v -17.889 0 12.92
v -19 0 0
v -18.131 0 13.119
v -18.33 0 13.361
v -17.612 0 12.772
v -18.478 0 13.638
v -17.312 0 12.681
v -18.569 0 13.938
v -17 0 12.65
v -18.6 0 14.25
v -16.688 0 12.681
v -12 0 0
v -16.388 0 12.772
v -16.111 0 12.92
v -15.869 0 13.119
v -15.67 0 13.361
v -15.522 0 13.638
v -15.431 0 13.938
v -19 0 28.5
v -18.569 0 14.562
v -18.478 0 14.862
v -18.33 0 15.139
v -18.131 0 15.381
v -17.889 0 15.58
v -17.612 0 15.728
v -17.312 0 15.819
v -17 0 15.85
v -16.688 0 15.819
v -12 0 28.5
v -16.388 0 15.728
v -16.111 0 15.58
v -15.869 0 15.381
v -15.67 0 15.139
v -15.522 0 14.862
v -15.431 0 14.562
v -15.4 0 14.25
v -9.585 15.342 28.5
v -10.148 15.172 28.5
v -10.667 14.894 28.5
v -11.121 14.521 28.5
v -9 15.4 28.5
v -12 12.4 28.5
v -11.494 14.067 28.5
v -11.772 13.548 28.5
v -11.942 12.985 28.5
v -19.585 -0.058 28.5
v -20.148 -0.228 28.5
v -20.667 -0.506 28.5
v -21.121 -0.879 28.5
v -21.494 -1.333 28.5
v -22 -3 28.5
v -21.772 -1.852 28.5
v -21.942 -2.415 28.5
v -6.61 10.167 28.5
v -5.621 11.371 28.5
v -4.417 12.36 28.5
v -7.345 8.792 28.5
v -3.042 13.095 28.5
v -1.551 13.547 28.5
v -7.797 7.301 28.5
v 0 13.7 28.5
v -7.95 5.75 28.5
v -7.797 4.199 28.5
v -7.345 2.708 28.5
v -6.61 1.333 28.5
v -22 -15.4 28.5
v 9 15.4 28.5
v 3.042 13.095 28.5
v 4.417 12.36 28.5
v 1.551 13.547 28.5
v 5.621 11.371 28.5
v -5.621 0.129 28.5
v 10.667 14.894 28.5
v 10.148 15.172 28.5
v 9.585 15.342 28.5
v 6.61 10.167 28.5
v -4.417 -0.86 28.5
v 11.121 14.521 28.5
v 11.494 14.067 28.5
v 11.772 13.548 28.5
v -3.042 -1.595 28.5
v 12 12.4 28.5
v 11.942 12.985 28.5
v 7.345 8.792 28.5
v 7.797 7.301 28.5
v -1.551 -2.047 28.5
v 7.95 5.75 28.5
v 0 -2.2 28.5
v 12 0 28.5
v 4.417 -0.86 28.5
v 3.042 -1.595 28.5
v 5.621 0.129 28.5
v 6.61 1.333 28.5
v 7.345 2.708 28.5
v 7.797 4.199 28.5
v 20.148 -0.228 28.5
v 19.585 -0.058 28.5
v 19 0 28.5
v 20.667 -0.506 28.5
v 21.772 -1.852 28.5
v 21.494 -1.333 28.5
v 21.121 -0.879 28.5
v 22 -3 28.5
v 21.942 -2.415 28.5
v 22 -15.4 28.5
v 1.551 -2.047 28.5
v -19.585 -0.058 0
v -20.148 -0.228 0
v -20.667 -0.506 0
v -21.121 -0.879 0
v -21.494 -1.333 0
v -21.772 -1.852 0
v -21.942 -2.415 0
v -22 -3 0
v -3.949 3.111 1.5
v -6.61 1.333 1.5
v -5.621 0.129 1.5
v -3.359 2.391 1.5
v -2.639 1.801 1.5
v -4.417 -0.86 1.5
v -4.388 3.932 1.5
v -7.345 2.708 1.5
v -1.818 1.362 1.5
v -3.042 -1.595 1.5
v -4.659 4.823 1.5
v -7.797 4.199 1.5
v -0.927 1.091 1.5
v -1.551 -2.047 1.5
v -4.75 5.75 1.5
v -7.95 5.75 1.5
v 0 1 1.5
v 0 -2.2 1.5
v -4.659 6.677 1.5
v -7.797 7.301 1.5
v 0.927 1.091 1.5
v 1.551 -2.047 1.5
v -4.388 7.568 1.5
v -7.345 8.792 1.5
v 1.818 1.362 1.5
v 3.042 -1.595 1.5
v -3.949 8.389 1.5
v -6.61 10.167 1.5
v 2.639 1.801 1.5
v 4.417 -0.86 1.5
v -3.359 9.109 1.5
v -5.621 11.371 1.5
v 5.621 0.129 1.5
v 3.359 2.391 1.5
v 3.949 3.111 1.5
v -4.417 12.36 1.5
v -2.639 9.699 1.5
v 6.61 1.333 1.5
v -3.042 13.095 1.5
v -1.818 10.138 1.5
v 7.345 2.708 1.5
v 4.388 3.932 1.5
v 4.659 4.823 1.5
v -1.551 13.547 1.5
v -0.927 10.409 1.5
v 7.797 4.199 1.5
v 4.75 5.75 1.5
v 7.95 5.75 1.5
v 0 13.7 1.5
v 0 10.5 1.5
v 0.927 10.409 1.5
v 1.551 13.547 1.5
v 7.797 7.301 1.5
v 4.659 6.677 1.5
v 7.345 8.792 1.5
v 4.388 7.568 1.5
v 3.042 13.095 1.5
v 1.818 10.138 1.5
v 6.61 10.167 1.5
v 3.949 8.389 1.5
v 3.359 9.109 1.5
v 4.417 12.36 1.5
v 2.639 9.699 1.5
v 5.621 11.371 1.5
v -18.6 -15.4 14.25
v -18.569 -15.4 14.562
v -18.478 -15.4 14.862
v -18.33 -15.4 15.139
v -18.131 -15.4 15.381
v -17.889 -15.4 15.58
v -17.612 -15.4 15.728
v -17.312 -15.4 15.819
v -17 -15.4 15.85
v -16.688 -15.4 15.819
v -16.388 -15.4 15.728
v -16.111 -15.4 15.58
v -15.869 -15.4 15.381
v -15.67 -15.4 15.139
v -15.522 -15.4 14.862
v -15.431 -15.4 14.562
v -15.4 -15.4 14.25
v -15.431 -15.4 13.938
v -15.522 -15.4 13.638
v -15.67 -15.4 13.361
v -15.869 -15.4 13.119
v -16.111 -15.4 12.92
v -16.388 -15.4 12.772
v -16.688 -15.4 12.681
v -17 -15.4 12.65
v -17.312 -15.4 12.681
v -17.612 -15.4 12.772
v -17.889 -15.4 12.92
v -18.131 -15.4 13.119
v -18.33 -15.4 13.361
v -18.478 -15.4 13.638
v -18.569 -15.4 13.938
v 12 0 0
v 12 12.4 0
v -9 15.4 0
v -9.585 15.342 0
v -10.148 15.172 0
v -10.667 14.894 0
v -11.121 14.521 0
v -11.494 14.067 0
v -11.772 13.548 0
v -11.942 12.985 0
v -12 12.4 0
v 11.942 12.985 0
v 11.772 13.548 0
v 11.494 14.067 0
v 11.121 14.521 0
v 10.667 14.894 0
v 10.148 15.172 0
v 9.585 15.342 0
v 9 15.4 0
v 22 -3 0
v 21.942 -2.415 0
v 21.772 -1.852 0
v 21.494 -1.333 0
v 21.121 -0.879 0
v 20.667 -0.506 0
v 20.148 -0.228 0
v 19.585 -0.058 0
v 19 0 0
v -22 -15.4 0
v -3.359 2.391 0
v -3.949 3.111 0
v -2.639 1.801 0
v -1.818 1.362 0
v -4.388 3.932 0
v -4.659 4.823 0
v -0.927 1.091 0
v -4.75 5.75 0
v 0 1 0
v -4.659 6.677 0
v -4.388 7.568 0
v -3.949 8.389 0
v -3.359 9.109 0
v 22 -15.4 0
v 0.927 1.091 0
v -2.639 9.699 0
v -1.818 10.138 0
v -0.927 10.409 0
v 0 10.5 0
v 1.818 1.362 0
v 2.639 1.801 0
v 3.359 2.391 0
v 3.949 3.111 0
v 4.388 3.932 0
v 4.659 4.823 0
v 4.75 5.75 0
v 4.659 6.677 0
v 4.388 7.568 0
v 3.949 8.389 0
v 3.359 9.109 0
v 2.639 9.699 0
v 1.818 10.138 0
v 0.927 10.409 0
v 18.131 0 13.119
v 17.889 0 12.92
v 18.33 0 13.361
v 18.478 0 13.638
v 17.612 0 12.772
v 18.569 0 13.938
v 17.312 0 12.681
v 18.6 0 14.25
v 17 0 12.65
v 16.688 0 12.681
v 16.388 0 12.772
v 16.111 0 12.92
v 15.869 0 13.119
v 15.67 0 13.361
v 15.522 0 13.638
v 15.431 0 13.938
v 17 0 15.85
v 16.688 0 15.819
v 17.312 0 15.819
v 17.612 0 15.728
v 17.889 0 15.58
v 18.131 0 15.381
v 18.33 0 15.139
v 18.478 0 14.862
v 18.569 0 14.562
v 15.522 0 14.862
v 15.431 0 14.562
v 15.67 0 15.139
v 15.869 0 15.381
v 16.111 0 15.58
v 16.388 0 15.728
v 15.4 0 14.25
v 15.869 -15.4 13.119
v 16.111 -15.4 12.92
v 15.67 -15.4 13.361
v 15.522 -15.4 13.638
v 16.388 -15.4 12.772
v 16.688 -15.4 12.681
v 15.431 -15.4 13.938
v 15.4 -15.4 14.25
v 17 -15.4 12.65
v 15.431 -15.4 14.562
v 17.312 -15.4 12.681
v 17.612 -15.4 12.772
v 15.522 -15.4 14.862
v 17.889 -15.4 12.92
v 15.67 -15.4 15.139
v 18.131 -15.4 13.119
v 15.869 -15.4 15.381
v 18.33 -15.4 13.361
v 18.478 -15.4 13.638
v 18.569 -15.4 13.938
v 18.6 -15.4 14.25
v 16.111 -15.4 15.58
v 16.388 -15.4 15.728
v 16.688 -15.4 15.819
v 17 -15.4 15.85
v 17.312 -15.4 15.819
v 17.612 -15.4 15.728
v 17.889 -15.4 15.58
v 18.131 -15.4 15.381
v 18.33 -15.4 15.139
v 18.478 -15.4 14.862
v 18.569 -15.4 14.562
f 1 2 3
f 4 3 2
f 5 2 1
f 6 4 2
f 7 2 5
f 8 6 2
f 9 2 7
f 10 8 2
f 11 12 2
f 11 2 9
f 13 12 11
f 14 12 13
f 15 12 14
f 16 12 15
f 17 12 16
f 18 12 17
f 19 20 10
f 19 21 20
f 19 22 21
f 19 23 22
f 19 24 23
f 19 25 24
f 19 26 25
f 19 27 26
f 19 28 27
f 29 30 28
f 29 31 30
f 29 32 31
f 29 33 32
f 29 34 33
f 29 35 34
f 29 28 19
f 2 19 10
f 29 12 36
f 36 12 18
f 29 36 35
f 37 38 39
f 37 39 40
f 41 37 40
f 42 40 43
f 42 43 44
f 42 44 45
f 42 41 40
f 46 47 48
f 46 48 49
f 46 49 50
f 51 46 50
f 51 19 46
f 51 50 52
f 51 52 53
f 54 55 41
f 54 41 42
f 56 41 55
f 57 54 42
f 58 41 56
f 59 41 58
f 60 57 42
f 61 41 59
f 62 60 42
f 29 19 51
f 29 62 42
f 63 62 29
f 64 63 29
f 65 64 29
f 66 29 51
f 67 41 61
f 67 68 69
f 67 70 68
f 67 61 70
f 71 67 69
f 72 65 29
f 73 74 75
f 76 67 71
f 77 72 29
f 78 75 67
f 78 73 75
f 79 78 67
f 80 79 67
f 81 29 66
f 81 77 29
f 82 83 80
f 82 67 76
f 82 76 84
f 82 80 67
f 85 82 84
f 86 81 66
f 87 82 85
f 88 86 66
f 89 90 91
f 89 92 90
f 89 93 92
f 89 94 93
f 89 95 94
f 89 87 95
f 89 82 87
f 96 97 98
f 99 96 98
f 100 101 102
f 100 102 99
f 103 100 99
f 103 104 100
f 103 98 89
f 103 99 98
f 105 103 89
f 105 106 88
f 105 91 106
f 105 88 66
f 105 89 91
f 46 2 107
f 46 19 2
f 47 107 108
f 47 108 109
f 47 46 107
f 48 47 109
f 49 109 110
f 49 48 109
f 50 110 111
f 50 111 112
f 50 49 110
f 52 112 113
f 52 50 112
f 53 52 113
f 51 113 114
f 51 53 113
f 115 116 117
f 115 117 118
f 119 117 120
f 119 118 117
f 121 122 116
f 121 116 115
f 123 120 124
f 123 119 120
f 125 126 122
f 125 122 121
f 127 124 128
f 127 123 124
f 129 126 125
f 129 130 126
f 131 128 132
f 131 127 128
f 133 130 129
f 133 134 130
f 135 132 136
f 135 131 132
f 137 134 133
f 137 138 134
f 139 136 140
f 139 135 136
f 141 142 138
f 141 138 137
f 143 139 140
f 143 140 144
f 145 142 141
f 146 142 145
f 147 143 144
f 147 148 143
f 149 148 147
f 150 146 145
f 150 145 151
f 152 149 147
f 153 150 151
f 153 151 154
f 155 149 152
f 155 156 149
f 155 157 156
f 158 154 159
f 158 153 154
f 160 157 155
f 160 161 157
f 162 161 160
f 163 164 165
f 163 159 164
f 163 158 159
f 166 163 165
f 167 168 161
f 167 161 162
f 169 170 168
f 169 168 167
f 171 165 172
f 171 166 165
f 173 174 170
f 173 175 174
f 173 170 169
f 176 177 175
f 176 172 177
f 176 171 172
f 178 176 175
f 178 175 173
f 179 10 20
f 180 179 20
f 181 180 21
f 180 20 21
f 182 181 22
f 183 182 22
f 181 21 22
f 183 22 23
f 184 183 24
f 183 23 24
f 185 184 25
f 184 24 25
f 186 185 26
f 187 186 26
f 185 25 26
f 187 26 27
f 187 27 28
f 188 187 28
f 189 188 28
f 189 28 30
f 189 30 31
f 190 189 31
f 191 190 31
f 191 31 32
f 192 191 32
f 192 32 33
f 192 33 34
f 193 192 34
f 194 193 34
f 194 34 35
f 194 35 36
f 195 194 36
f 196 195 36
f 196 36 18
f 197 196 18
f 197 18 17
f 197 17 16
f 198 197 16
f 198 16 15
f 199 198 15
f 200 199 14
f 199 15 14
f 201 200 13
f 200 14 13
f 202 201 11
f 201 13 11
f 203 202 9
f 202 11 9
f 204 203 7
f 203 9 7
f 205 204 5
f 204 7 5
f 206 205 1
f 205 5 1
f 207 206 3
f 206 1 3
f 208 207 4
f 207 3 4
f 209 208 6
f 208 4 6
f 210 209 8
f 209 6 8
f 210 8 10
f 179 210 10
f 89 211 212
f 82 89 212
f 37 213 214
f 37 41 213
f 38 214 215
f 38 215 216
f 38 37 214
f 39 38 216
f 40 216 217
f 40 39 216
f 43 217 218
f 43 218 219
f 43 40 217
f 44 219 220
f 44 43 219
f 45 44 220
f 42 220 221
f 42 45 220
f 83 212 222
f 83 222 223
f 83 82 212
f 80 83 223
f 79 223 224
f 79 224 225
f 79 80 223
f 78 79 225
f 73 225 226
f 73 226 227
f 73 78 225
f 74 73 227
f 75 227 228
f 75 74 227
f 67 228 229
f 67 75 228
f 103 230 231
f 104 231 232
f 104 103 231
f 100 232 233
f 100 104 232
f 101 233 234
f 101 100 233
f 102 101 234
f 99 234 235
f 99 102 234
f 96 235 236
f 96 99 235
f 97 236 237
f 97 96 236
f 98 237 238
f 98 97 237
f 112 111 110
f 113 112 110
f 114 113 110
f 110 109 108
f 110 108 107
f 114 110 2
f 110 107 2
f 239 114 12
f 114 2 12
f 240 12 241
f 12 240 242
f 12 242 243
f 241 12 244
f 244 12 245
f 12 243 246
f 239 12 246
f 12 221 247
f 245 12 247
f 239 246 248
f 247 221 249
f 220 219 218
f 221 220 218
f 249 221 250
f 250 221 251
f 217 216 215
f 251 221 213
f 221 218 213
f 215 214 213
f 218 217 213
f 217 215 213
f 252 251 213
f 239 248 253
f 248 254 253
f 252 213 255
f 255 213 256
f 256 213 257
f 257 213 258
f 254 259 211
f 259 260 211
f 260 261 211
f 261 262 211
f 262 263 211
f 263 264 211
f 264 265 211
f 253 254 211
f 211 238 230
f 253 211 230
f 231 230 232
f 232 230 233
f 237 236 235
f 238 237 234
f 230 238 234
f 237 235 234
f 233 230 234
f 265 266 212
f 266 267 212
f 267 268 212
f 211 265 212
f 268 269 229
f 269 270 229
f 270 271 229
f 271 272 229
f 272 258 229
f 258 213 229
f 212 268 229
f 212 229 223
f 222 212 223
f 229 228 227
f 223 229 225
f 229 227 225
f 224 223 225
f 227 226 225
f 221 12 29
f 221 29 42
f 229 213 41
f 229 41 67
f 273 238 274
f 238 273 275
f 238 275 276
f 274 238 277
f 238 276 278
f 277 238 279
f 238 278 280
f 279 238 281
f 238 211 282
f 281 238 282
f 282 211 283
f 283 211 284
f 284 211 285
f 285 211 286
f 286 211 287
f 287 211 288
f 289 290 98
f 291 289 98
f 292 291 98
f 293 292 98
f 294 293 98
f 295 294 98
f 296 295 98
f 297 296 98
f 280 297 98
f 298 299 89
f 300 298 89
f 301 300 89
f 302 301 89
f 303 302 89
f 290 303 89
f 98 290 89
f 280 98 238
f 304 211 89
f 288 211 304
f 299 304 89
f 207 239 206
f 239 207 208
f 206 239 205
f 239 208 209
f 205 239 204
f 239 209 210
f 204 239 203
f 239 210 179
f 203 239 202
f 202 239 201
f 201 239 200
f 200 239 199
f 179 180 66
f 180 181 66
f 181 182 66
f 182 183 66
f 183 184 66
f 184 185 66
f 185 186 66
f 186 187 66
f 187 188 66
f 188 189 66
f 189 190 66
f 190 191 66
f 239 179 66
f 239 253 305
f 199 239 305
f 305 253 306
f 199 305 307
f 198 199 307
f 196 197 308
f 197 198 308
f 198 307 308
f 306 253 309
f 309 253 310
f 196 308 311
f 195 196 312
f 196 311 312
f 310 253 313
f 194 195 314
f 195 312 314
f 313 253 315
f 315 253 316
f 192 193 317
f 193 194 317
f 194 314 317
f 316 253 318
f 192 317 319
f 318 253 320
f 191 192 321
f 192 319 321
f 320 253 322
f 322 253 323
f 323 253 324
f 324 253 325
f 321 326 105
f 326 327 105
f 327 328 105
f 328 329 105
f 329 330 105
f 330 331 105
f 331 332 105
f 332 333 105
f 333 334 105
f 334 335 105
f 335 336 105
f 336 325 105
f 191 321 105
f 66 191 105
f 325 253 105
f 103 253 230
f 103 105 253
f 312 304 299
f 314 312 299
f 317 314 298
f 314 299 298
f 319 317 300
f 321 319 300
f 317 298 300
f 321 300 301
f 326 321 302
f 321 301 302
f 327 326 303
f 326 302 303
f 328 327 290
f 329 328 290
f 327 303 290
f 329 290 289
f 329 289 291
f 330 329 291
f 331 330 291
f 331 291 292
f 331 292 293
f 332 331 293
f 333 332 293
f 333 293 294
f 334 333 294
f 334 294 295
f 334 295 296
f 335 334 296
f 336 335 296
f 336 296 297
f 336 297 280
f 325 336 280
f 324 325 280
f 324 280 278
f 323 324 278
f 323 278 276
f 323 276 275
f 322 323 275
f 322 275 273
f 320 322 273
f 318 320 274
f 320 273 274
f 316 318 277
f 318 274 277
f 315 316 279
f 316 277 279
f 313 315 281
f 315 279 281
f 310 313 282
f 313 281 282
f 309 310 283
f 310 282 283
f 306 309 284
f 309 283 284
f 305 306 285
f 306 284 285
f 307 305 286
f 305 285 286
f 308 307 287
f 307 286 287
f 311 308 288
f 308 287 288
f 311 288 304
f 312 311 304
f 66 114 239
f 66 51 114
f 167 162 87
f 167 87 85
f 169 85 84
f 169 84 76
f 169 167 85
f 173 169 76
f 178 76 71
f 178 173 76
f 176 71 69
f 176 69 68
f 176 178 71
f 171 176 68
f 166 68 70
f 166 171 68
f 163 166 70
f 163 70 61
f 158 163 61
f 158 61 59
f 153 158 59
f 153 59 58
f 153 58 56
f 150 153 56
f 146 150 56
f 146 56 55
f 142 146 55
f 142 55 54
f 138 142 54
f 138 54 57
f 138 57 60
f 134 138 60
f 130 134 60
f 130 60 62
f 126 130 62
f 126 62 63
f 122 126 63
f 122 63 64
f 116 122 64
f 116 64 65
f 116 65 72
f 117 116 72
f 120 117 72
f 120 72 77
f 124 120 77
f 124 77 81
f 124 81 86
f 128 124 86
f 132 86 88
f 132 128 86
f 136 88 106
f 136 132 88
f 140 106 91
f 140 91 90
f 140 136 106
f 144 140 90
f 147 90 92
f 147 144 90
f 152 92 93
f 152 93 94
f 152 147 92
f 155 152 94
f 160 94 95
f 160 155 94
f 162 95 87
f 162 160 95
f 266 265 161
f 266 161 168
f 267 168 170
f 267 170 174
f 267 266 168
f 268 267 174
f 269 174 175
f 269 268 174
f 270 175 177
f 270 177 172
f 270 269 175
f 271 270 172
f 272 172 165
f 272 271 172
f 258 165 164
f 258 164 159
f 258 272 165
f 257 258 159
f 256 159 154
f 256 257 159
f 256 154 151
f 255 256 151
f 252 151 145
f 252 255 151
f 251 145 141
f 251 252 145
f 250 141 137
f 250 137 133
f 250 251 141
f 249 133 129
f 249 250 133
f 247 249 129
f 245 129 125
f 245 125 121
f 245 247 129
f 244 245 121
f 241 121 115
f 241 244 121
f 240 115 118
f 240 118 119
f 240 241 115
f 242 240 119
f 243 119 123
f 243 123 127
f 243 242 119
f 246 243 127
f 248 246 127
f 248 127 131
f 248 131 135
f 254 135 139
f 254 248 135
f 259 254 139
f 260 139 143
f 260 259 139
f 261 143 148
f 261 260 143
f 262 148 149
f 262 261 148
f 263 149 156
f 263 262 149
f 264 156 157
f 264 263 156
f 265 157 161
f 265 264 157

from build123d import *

# Parameters (mm, degrees)
F0_W     = 24
F0_H     = 30.8
F0_R     = 7.95
F1_DEPTH = 28.5
F3_W     = 15.4
F3_H     = 28.5
F4_DEPTH = 10
F2_W     = 15.4
F2_H     = 28.5
F5_DEPTH = 10
F6_R     = 1.6
F7_DEPTH = 30.801
F0_R_2   = 4.75
F8_DEPTH = 1.5
F9_R     = 3


with BuildPart() as f1:
    # F0 (on Top) → F1 (new body)
    with BuildSketch(Plane.XY):
        Rectangle(F0_W, F0_H)
        with Locations((0, 5.75)):
            Circle(F0_R, mode=Mode.SUBTRACT)
    extrude(amount=F1_DEPTH)

    # F3 (on face) → F4 (join)
    with BuildSketch(Plane.YZ.offset(12)):
        with Locations((-7.7, 14.25)):
            Rectangle(F3_W, F3_H)
    extrude(amount=F4_DEPTH)

    # F2 (on face) → F5 (join)
    with BuildSketch(Plane(origin=(-12, 0, 0), x_dir=(0, -1, 0), z_dir=(-1, 0, 0))):
        with Locations((7.7, 14.25)):
            Rectangle(F2_W, F2_H)
    extrude(amount=F5_DEPTH)

    # F6 (on face) → F7 (cut, through all)
    with BuildSketch(Plane(origin=(0, 15.4, 0), x_dir=(-1, 0, 0), z_dir=(0, 1, 0))):
        with Locations((-17, 14.25)):
            Circle(F6_R)
        with Locations((17, 14.25)):
            Circle(F6_R)
    extrude(amount=-F7_DEPTH, mode=Mode.SUBTRACT)

    # F0 (on Top) → F8 (join)
    with BuildSketch(Plane.XY):
        with Locations((0, 5.75)):
            Circle(F0_R)
        with Locations((0, 5.75)):
            Circle(F0_R_2, mode=Mode.SUBTRACT)
    extrude(amount=F8_DEPTH)

    # F9
    f9_edges = [f1.edges().sort_by_distance(p)[0] for p in [
        (12, 15.4, 14.25),
        (22, 0, 14.25),
        (-22, 0, 14.25),
        (-12, 15.4, 14.25),
    ]]
    fillet(f9_edges, radius=F9_R)


solid = f1.part
